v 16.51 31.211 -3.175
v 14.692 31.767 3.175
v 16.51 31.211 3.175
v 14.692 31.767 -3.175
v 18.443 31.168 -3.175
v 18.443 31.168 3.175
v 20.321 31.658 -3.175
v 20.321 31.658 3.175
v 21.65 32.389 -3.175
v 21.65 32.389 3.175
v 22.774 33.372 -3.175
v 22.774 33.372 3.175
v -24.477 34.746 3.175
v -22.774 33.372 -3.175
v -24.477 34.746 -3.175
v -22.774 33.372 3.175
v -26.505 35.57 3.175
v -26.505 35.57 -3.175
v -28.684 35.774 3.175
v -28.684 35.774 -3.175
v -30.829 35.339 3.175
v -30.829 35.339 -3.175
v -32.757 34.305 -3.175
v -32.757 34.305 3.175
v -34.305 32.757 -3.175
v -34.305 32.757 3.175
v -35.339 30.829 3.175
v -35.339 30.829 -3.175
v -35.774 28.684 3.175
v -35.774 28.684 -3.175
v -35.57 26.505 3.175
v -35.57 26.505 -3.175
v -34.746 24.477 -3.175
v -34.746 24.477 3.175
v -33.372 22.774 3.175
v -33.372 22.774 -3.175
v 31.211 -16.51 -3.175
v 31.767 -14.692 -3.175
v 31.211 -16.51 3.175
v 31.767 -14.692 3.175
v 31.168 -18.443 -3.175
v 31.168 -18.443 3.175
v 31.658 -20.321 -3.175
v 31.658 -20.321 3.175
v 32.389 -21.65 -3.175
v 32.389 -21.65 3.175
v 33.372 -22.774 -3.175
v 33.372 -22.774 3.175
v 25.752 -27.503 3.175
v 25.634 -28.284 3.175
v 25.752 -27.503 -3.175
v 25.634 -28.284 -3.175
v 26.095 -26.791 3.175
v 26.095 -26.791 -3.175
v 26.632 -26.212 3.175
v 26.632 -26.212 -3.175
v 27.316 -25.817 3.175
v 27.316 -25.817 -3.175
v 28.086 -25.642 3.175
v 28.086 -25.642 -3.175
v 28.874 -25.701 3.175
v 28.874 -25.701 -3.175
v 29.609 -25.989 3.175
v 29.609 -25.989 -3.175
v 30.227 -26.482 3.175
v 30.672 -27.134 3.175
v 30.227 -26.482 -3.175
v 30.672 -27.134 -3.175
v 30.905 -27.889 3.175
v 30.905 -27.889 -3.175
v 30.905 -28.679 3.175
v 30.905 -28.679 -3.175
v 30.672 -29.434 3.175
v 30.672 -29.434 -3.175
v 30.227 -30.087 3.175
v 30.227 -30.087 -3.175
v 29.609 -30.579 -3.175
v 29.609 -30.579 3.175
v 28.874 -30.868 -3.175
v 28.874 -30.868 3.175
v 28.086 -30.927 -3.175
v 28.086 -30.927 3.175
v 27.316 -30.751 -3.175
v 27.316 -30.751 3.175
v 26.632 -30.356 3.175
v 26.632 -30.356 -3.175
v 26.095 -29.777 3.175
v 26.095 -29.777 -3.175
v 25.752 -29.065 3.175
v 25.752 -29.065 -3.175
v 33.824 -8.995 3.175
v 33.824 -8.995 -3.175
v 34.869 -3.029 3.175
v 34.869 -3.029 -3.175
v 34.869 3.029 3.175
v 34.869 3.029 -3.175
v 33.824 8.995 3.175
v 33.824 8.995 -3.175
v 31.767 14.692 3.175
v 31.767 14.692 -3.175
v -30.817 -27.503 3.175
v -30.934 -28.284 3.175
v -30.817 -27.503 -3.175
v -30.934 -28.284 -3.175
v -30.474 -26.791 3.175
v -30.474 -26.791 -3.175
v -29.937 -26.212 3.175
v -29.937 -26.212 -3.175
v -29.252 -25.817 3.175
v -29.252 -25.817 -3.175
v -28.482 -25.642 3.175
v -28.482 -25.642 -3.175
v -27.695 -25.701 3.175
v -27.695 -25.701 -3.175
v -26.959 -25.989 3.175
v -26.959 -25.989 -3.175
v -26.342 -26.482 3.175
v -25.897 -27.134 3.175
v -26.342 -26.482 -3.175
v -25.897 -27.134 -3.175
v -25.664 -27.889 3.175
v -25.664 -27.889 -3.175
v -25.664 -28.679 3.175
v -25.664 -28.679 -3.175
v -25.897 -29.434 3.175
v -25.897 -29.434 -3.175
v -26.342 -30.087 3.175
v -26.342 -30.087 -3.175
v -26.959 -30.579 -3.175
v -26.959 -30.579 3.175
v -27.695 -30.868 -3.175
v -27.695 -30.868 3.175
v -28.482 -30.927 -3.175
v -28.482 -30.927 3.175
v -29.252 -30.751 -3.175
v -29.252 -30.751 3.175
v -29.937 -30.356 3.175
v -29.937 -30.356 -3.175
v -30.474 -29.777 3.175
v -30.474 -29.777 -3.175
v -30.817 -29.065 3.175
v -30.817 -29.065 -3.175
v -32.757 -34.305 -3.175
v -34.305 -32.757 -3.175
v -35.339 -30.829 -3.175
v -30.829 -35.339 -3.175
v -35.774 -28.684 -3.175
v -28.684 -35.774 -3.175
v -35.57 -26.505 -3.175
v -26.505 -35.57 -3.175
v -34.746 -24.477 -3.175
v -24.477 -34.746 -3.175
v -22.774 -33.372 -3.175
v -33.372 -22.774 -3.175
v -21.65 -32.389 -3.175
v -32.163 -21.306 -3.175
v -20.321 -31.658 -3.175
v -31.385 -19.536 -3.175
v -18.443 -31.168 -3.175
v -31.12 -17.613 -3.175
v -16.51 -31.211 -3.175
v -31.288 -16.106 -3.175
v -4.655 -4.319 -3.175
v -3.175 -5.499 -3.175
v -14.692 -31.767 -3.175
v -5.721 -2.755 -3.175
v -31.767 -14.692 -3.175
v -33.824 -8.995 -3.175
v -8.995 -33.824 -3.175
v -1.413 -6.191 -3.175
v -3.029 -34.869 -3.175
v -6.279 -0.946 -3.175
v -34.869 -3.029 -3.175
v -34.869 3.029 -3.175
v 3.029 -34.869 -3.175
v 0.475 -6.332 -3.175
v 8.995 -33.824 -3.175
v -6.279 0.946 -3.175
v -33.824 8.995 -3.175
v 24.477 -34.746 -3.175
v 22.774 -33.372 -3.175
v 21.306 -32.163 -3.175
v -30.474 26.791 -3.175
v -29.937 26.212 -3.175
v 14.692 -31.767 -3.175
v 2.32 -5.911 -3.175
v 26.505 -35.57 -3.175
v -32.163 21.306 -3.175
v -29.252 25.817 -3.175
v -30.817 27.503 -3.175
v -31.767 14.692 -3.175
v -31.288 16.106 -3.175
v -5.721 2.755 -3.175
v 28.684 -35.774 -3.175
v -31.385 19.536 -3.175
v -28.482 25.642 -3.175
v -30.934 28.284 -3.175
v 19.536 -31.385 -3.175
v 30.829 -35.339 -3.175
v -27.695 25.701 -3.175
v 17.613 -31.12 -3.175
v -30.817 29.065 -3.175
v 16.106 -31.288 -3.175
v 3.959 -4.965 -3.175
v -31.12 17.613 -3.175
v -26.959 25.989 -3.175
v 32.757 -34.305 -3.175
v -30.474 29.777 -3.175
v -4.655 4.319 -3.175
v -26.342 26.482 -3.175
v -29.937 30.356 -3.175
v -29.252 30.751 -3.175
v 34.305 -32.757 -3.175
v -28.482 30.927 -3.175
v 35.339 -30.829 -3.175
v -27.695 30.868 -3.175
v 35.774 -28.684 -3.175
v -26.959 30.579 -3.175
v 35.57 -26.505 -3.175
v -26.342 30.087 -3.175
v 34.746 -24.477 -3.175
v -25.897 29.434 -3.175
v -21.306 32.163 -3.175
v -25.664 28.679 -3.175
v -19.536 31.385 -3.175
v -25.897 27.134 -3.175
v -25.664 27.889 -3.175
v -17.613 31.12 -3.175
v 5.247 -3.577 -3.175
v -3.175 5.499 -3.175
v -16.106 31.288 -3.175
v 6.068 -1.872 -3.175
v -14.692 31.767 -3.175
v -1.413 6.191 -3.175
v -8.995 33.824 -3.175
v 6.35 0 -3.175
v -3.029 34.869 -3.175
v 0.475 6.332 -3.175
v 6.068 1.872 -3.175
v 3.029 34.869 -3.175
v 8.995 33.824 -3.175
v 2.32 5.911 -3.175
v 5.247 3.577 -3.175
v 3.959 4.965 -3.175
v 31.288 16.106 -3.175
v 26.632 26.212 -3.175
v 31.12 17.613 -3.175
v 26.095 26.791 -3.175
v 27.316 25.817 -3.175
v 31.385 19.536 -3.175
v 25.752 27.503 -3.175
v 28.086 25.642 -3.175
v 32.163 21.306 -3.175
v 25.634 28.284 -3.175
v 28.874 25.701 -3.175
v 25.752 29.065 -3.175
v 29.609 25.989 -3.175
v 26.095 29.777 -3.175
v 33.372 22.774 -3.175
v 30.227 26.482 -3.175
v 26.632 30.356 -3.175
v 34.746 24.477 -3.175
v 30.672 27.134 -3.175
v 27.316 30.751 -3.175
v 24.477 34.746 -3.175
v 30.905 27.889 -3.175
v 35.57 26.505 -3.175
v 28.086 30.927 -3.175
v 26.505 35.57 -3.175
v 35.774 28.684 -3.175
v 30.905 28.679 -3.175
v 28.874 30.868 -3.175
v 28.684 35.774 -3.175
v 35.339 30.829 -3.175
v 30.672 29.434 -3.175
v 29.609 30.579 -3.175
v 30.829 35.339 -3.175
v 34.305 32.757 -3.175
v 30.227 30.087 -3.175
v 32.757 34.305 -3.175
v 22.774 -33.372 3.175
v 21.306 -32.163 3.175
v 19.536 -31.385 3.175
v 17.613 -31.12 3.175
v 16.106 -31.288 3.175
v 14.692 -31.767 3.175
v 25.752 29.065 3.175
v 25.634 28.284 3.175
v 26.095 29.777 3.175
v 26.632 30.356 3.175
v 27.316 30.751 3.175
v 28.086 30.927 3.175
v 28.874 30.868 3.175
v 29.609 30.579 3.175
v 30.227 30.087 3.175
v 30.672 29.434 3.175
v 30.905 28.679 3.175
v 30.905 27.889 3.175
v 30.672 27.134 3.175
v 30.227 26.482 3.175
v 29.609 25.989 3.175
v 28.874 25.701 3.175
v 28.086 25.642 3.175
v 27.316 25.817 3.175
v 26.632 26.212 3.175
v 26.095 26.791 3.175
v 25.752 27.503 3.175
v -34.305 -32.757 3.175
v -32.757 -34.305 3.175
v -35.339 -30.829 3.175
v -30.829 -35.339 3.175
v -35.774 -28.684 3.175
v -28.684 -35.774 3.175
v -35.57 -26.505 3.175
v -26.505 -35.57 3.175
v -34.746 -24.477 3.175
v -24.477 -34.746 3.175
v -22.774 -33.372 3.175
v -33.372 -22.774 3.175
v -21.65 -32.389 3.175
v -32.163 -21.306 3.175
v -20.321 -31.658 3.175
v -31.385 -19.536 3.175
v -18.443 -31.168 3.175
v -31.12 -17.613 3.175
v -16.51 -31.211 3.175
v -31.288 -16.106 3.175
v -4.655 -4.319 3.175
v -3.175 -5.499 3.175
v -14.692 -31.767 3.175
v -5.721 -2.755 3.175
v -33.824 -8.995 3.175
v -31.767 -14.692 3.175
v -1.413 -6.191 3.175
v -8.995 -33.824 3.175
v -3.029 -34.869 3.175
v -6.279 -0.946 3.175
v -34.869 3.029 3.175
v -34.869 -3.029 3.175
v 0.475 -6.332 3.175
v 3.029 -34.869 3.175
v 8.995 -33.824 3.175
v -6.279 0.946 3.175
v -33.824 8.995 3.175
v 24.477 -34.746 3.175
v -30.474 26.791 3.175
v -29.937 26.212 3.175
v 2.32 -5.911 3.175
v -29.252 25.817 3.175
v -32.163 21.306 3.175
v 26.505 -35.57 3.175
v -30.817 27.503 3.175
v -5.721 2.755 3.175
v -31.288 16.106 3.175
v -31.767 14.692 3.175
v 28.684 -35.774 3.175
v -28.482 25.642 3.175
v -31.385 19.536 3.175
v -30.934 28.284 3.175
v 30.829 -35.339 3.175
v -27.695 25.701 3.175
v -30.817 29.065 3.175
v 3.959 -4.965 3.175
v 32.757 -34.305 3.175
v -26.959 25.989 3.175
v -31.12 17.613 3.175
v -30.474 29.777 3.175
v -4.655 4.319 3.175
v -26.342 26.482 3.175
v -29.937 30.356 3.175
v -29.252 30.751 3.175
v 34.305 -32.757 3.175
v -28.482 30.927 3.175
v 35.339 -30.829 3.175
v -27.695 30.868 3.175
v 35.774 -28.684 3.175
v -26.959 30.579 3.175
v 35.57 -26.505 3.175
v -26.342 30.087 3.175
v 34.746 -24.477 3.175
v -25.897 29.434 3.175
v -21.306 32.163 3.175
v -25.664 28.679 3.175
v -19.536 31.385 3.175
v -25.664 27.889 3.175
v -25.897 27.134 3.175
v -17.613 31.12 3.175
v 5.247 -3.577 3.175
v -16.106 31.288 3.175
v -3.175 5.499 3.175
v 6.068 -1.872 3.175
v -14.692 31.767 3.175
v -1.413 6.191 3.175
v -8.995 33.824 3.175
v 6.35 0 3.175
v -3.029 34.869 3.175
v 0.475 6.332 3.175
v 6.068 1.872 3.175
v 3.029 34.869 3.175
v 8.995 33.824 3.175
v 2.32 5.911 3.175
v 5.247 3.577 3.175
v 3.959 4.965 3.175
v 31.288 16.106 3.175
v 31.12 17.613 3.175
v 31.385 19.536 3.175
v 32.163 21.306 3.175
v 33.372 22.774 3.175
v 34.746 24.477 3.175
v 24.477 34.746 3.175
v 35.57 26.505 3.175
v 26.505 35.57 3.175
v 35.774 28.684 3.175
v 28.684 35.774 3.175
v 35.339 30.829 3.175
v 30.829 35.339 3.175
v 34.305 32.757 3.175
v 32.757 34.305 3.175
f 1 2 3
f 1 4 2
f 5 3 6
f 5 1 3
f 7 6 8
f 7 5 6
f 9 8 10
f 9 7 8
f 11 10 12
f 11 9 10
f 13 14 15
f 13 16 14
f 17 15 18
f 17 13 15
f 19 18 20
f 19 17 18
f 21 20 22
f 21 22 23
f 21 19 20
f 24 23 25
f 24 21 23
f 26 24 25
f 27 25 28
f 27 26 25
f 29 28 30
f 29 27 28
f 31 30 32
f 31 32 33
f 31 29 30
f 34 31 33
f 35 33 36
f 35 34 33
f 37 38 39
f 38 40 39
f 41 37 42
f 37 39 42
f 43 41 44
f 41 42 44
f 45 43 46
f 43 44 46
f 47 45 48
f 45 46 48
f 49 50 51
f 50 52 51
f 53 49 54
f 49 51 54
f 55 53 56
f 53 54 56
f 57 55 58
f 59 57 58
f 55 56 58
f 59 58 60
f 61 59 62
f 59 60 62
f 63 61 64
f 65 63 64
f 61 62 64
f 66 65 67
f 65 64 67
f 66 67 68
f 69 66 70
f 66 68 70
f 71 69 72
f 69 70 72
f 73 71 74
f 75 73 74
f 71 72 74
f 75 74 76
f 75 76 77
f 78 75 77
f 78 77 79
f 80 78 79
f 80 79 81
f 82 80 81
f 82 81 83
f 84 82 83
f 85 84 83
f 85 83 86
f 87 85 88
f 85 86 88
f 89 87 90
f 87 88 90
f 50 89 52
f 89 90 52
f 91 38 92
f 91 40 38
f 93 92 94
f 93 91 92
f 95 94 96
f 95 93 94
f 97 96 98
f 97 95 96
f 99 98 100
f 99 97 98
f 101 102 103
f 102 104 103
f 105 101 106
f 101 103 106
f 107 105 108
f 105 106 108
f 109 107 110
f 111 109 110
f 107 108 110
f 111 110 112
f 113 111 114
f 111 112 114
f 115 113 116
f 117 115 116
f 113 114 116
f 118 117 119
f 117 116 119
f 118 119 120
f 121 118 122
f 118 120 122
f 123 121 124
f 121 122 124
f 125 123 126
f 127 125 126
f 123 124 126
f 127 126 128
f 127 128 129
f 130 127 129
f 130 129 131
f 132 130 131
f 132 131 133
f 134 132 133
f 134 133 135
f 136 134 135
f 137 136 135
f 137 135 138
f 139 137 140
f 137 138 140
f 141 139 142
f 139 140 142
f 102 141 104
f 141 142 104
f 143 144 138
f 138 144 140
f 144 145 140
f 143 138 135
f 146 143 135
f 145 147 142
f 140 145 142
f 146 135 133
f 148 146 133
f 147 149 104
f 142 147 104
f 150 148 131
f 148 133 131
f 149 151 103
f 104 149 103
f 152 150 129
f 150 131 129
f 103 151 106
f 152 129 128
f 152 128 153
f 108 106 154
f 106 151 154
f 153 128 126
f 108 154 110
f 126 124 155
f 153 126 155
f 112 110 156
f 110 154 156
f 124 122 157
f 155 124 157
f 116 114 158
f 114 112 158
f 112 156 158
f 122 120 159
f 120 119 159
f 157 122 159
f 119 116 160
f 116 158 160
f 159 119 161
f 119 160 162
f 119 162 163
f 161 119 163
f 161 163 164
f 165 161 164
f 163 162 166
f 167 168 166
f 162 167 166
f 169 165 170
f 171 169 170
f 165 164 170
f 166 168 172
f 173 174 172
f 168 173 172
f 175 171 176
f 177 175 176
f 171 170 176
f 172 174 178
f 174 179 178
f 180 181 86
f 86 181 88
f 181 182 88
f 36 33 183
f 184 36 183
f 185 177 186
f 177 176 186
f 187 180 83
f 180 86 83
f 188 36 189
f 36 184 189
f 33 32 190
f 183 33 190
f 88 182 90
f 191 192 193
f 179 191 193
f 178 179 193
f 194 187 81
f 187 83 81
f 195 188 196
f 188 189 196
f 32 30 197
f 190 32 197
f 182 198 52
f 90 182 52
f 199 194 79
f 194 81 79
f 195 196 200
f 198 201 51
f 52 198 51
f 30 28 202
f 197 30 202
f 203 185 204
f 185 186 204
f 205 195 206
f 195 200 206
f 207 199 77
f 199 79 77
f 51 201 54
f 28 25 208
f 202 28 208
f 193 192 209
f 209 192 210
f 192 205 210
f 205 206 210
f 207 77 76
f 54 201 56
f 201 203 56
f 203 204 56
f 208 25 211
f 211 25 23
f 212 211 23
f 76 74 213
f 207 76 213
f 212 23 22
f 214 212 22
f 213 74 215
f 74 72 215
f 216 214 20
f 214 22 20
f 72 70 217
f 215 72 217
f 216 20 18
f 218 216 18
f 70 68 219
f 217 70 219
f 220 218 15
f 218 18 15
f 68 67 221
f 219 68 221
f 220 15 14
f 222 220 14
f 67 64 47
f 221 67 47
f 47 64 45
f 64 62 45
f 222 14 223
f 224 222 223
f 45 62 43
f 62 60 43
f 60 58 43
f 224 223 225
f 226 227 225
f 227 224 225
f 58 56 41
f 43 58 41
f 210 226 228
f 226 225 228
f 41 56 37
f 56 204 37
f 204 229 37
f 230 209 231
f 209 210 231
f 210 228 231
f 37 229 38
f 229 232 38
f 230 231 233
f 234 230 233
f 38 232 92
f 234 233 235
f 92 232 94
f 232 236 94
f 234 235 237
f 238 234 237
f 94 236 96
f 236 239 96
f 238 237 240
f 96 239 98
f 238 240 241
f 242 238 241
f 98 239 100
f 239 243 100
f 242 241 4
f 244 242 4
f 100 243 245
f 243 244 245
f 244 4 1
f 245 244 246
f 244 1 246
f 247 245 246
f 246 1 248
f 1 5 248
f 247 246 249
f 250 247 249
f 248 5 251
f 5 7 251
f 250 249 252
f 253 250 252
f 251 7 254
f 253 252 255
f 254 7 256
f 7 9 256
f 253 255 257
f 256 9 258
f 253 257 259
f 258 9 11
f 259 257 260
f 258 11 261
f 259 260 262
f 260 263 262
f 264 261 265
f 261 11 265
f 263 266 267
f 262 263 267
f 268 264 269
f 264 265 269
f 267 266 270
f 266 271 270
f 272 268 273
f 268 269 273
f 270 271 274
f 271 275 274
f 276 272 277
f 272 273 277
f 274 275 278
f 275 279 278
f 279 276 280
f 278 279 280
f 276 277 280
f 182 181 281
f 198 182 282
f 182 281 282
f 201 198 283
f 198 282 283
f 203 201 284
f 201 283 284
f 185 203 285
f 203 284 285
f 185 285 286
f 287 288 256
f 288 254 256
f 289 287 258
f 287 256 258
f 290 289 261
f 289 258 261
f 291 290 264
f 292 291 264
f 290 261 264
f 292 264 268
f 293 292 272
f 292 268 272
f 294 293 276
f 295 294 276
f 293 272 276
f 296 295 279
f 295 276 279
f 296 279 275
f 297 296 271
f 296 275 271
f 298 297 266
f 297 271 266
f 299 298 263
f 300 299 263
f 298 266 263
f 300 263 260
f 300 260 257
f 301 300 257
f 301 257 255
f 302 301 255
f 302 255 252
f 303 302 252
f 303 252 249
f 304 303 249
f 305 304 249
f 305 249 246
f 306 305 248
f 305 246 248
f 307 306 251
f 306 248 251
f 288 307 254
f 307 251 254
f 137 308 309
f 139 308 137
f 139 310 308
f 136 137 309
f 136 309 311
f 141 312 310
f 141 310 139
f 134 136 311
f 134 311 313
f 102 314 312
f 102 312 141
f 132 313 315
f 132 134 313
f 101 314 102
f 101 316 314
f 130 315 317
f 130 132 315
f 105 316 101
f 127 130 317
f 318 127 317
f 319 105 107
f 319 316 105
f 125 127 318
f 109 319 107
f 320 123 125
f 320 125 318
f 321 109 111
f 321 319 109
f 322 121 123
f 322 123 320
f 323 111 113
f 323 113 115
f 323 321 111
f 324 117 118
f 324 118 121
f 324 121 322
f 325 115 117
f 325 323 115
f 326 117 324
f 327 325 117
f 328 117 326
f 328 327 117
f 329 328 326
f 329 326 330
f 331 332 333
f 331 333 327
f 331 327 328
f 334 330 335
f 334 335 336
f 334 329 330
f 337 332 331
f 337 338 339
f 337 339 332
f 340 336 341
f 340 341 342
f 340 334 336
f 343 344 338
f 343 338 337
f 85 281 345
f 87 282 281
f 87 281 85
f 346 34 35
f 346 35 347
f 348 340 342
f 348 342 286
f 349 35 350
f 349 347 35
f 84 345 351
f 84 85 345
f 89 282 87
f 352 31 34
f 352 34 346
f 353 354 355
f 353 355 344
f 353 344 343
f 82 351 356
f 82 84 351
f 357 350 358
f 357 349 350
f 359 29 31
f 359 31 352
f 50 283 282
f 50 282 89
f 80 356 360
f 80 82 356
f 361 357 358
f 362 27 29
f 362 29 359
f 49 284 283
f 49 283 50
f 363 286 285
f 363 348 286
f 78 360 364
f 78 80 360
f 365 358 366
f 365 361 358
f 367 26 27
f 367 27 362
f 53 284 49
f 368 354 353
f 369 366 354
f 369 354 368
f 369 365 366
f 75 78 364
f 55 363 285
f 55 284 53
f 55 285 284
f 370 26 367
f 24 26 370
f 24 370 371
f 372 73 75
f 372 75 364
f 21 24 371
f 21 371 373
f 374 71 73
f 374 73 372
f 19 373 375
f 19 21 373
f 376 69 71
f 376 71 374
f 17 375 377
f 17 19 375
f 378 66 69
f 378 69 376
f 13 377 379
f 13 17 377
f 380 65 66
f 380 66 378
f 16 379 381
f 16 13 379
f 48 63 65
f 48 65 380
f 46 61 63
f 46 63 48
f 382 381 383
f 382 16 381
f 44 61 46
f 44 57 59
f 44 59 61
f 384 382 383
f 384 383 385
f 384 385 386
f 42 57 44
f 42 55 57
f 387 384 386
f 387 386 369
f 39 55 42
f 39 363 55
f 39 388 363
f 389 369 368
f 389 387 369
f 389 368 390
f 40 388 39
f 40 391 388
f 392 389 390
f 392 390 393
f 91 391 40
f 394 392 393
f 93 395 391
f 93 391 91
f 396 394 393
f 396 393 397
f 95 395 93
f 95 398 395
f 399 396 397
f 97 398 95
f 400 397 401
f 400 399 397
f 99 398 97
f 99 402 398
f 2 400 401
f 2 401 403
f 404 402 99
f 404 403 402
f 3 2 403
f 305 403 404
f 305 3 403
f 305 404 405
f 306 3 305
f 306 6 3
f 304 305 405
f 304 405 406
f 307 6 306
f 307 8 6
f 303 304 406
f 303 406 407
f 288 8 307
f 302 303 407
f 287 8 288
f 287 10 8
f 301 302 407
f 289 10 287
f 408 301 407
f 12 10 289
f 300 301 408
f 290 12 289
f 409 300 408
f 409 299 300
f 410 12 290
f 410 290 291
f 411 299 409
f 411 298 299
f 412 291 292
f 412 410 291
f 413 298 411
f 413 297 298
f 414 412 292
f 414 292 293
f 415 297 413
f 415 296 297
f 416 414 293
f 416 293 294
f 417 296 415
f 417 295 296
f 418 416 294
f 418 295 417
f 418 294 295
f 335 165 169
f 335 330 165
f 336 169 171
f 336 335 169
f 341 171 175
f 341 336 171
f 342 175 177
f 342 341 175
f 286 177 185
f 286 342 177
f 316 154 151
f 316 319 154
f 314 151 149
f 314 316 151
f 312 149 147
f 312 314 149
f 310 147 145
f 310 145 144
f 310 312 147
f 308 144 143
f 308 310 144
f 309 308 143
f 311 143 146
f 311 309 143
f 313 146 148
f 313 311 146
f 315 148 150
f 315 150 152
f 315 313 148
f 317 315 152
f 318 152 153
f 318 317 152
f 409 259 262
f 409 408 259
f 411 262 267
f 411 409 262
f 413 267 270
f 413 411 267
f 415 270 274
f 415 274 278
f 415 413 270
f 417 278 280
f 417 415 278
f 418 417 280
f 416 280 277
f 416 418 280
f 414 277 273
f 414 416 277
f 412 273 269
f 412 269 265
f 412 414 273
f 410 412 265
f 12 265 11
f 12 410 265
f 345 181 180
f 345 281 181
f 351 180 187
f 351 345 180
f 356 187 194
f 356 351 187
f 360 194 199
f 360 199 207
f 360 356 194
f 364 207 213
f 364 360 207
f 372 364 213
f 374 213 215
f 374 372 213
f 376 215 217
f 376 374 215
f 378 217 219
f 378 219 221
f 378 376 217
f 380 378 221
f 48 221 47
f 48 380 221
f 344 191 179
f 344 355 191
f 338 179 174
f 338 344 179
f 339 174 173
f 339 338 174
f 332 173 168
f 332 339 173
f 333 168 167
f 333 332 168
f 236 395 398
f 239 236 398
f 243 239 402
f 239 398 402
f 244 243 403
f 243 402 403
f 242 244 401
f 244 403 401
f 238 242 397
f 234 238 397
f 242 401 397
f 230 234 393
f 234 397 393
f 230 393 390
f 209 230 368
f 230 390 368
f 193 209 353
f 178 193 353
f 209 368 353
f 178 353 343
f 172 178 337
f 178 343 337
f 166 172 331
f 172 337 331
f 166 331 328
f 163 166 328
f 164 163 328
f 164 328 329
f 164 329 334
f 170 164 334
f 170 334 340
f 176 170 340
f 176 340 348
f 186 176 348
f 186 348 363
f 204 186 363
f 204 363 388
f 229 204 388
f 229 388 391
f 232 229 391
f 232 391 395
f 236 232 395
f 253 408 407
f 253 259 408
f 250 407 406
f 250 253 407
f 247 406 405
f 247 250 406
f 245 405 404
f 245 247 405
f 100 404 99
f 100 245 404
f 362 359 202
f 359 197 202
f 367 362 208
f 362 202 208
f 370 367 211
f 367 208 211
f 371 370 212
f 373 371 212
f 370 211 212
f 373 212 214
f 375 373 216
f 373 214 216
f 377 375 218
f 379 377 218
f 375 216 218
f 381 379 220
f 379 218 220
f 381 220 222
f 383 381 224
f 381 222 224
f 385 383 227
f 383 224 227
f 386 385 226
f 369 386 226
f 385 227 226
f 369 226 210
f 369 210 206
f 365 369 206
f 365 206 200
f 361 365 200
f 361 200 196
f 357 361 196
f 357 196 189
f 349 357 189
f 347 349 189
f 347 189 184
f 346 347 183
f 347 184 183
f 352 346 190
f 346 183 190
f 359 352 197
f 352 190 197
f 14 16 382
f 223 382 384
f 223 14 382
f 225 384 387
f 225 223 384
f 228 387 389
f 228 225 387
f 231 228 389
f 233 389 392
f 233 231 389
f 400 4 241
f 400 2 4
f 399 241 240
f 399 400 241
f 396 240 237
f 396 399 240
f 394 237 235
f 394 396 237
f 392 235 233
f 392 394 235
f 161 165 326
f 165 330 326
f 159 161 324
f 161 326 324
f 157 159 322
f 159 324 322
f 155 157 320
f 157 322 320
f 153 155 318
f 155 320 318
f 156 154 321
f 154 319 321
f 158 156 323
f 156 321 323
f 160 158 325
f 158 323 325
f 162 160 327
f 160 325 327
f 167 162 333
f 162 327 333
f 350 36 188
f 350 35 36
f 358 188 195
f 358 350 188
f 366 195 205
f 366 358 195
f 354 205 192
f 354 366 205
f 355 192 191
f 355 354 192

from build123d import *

# Parameters (mm, degrees)
BOSS_EXTRUDE1_DEPTH      = 3.175
FILLET1_R                = 7
M5_CLEARANCE_HOLE1_D     = 5.3
M5_CLEARANCE_HOLE1_DEPTH = 6.35
M5_CLEARANCE_HOLE1_TIP   = 1.59228064
SKETCH4_R                = 6.35
CUT_EXTRUDE1_DEPTH       = 52.003437659


with BuildPart() as part:
    # Sketch1 → Boss-Extrude1 (new, symmetric)
    with BuildSketch(Plane.XY):
        with BuildLine():
            ThreePointArc((-20.785305148, 28.159742362), (-33.587572106, 33.587572106), (-28.159742362, 20.785305148))
            ThreePointArc((-28.159742362, 20.785305148), (-35, 0), (-28.159742362, -20.785305148))
            ThreePointArc((-28.159742362, -20.785305148), (-33.587572106, -33.587572106), (-20.785305148, -28.159742362))
            ThreePointArc((-20.785305148, -28.159742362), (0, -35), (20.785305148, -28.159742362))
            ThreePointArc((20.785305148, -28.159742362), (33.587572106, -33.587572106), (28.159742362, -20.785305148))
            ThreePointArc((28.159742362, -20.785305148), (35, 0), (28.159742362, 20.785305148))
            ThreePointArc((28.159742362, 20.785305148), (33.587572106, 33.587572106), (20.785305148, 28.159742362))
            ThreePointArc((20.785305148, 28.159742362), (0, 35), (-20.785305148, 28.159742362))
        make_face()
    extrude(amount=BOSS_EXTRUDE1_DEPTH, both=True)

    # Fillet1
    fillet1_edges = [part.edges().sort_by_distance(p)[0] for p in [
        (20.785305148, 28.159742362, 0),
        (28.159742362, 20.785305148, 0),
        (28.159742362, -20.785305148, 0),
        (20.785305148, -28.159742362, 0),
        (-20.785305148, -28.159742362, 0),
        (-28.159742362, -20.785305148, 0),
        (-28.159742362, 20.785305148, 0),
        (-20.785305148, 28.159742362, 0),
    ]]
    fillet(fillet1_edges, radius=FILLET1_R)

    # M5 Clearance Hole1
    with Locations(Plane.XY.offset(3.175)):
        with Locations((-28.284271247, 28.284271247), (28.284271247, 28.284271247), (28.284271247, -28.284271247), (-28.284271247, -28.284271247)):
            Hole(M5_CLEARANCE_HOLE1_D / 2, depth=M5_CLEARANCE_HOLE1_DEPTH)
            with Locations((0, 0, -(M5_CLEARANCE_HOLE1_DEPTH + M5_CLEARANCE_HOLE1_TIP / 2))):  # 118° drill point
                Cone(0, M5_CLEARANCE_HOLE1_D / 2, M5_CLEARANCE_HOLE1_TIP, mode=Mode.SUBTRACT)

    # Sketch4 → Cut-Extrude1 (cut, through all)
    with BuildSketch(Plane.XY.offset(3.175)):
        Circle(SKETCH4_R)
    extrude(amount=-CUT_EXTRUDE1_DEPTH, mode=Mode.SUBTRACT)


solid = part.part
